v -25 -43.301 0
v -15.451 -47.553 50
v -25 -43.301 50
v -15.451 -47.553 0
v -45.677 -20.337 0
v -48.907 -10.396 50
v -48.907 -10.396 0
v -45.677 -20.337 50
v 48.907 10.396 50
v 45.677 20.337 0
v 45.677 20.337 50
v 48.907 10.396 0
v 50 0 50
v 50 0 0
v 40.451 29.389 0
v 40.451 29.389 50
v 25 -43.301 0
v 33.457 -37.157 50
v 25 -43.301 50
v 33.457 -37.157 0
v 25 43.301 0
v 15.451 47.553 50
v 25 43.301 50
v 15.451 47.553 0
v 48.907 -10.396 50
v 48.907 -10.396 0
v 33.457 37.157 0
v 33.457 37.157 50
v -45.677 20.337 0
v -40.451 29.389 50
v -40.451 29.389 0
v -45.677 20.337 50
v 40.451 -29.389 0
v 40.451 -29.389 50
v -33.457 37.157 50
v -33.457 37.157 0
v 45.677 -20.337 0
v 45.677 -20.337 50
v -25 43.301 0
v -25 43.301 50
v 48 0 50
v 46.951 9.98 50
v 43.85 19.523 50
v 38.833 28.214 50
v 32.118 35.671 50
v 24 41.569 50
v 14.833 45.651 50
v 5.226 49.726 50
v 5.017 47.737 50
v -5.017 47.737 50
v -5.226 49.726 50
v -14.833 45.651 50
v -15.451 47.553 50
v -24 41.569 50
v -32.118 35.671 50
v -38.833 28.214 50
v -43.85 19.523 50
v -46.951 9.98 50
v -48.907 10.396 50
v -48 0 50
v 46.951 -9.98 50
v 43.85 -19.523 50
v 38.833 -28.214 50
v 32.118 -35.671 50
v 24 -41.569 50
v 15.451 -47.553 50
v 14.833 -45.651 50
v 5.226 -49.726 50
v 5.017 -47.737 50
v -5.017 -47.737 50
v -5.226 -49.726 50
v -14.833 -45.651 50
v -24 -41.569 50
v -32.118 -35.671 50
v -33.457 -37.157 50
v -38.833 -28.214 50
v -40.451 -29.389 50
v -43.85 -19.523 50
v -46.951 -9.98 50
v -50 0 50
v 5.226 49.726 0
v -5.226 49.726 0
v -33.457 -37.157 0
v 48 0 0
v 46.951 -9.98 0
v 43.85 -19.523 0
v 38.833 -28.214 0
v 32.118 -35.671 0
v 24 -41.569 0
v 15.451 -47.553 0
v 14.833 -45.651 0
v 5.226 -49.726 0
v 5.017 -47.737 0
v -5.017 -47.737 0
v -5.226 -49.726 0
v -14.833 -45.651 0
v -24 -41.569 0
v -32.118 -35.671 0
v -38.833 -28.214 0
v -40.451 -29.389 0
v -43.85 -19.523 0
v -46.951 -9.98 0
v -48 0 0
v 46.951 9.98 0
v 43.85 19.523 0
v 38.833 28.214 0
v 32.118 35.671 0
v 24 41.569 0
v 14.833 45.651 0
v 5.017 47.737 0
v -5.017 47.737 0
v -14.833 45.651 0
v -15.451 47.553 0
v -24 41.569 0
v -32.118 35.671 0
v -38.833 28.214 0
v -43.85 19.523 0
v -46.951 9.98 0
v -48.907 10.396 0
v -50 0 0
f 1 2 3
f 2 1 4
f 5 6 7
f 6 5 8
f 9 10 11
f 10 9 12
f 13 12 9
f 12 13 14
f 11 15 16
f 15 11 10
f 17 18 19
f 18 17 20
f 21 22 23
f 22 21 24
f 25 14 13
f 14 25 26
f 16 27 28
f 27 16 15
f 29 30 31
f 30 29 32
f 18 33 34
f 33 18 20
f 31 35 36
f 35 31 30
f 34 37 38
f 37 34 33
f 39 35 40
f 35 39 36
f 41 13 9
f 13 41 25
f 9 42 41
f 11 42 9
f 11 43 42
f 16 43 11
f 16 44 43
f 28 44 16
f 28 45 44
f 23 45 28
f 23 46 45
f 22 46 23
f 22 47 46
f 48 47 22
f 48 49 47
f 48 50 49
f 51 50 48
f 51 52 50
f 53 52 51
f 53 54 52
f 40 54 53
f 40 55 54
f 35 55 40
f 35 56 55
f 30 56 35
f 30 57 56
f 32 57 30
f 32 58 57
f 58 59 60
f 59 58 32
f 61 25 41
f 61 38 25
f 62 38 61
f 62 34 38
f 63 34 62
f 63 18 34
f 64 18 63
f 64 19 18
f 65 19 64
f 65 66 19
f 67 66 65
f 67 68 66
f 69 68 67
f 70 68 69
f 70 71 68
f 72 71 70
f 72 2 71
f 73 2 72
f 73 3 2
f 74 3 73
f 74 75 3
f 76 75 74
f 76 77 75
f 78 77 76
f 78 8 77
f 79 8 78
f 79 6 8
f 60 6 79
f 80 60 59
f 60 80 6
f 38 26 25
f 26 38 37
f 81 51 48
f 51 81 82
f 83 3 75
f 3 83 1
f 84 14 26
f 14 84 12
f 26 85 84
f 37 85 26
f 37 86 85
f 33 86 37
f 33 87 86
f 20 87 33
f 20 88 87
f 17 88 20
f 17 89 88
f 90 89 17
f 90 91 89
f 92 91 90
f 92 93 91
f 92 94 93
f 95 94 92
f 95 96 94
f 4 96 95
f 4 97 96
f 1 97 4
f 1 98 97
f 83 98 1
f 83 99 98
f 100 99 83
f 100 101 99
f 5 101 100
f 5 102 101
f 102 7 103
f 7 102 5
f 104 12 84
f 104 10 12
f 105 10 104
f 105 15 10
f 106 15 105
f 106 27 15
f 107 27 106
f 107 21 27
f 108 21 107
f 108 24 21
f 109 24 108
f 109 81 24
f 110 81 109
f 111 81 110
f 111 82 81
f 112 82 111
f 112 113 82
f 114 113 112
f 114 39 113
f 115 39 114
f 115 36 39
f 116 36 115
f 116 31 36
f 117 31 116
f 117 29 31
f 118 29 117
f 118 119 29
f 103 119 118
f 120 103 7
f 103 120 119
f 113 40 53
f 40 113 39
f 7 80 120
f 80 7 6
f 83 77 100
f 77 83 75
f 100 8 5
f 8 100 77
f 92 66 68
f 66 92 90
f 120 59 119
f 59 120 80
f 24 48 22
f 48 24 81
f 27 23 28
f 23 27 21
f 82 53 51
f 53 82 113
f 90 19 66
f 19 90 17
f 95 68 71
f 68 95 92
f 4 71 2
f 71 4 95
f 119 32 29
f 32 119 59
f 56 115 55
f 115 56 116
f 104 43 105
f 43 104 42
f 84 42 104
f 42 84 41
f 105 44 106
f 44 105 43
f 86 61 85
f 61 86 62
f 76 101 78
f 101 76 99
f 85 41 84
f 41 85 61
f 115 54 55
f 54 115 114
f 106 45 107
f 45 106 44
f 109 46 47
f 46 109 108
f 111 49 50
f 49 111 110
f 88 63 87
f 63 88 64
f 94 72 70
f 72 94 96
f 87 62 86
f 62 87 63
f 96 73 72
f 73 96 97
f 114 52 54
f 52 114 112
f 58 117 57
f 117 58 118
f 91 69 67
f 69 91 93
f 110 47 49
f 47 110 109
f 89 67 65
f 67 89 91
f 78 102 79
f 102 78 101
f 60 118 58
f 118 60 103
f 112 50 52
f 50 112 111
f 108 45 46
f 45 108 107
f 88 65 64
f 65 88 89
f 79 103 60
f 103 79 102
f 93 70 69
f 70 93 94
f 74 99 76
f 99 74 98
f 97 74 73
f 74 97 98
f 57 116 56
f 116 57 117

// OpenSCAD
// file: params.scad
DOME_DIA = 150;
DOME_THICK = 2.5;
ORING_DIA = 5.0;

function r_from_dia(d) = d / 2;
// main file
include<params.scad>

module prop_shroud(height=50)
{
    color([1,1,1,0.3])
    difference()
    {
		translate([0, 0, height/2])
        	cylinder(r=r_from_dia(100), h=height, center=true);
		translate([0, 0, height/2])
        	cylinder(r=r_from_dia(100)-2, h=height+1, center=true);
    }
}

prop_shroud();
